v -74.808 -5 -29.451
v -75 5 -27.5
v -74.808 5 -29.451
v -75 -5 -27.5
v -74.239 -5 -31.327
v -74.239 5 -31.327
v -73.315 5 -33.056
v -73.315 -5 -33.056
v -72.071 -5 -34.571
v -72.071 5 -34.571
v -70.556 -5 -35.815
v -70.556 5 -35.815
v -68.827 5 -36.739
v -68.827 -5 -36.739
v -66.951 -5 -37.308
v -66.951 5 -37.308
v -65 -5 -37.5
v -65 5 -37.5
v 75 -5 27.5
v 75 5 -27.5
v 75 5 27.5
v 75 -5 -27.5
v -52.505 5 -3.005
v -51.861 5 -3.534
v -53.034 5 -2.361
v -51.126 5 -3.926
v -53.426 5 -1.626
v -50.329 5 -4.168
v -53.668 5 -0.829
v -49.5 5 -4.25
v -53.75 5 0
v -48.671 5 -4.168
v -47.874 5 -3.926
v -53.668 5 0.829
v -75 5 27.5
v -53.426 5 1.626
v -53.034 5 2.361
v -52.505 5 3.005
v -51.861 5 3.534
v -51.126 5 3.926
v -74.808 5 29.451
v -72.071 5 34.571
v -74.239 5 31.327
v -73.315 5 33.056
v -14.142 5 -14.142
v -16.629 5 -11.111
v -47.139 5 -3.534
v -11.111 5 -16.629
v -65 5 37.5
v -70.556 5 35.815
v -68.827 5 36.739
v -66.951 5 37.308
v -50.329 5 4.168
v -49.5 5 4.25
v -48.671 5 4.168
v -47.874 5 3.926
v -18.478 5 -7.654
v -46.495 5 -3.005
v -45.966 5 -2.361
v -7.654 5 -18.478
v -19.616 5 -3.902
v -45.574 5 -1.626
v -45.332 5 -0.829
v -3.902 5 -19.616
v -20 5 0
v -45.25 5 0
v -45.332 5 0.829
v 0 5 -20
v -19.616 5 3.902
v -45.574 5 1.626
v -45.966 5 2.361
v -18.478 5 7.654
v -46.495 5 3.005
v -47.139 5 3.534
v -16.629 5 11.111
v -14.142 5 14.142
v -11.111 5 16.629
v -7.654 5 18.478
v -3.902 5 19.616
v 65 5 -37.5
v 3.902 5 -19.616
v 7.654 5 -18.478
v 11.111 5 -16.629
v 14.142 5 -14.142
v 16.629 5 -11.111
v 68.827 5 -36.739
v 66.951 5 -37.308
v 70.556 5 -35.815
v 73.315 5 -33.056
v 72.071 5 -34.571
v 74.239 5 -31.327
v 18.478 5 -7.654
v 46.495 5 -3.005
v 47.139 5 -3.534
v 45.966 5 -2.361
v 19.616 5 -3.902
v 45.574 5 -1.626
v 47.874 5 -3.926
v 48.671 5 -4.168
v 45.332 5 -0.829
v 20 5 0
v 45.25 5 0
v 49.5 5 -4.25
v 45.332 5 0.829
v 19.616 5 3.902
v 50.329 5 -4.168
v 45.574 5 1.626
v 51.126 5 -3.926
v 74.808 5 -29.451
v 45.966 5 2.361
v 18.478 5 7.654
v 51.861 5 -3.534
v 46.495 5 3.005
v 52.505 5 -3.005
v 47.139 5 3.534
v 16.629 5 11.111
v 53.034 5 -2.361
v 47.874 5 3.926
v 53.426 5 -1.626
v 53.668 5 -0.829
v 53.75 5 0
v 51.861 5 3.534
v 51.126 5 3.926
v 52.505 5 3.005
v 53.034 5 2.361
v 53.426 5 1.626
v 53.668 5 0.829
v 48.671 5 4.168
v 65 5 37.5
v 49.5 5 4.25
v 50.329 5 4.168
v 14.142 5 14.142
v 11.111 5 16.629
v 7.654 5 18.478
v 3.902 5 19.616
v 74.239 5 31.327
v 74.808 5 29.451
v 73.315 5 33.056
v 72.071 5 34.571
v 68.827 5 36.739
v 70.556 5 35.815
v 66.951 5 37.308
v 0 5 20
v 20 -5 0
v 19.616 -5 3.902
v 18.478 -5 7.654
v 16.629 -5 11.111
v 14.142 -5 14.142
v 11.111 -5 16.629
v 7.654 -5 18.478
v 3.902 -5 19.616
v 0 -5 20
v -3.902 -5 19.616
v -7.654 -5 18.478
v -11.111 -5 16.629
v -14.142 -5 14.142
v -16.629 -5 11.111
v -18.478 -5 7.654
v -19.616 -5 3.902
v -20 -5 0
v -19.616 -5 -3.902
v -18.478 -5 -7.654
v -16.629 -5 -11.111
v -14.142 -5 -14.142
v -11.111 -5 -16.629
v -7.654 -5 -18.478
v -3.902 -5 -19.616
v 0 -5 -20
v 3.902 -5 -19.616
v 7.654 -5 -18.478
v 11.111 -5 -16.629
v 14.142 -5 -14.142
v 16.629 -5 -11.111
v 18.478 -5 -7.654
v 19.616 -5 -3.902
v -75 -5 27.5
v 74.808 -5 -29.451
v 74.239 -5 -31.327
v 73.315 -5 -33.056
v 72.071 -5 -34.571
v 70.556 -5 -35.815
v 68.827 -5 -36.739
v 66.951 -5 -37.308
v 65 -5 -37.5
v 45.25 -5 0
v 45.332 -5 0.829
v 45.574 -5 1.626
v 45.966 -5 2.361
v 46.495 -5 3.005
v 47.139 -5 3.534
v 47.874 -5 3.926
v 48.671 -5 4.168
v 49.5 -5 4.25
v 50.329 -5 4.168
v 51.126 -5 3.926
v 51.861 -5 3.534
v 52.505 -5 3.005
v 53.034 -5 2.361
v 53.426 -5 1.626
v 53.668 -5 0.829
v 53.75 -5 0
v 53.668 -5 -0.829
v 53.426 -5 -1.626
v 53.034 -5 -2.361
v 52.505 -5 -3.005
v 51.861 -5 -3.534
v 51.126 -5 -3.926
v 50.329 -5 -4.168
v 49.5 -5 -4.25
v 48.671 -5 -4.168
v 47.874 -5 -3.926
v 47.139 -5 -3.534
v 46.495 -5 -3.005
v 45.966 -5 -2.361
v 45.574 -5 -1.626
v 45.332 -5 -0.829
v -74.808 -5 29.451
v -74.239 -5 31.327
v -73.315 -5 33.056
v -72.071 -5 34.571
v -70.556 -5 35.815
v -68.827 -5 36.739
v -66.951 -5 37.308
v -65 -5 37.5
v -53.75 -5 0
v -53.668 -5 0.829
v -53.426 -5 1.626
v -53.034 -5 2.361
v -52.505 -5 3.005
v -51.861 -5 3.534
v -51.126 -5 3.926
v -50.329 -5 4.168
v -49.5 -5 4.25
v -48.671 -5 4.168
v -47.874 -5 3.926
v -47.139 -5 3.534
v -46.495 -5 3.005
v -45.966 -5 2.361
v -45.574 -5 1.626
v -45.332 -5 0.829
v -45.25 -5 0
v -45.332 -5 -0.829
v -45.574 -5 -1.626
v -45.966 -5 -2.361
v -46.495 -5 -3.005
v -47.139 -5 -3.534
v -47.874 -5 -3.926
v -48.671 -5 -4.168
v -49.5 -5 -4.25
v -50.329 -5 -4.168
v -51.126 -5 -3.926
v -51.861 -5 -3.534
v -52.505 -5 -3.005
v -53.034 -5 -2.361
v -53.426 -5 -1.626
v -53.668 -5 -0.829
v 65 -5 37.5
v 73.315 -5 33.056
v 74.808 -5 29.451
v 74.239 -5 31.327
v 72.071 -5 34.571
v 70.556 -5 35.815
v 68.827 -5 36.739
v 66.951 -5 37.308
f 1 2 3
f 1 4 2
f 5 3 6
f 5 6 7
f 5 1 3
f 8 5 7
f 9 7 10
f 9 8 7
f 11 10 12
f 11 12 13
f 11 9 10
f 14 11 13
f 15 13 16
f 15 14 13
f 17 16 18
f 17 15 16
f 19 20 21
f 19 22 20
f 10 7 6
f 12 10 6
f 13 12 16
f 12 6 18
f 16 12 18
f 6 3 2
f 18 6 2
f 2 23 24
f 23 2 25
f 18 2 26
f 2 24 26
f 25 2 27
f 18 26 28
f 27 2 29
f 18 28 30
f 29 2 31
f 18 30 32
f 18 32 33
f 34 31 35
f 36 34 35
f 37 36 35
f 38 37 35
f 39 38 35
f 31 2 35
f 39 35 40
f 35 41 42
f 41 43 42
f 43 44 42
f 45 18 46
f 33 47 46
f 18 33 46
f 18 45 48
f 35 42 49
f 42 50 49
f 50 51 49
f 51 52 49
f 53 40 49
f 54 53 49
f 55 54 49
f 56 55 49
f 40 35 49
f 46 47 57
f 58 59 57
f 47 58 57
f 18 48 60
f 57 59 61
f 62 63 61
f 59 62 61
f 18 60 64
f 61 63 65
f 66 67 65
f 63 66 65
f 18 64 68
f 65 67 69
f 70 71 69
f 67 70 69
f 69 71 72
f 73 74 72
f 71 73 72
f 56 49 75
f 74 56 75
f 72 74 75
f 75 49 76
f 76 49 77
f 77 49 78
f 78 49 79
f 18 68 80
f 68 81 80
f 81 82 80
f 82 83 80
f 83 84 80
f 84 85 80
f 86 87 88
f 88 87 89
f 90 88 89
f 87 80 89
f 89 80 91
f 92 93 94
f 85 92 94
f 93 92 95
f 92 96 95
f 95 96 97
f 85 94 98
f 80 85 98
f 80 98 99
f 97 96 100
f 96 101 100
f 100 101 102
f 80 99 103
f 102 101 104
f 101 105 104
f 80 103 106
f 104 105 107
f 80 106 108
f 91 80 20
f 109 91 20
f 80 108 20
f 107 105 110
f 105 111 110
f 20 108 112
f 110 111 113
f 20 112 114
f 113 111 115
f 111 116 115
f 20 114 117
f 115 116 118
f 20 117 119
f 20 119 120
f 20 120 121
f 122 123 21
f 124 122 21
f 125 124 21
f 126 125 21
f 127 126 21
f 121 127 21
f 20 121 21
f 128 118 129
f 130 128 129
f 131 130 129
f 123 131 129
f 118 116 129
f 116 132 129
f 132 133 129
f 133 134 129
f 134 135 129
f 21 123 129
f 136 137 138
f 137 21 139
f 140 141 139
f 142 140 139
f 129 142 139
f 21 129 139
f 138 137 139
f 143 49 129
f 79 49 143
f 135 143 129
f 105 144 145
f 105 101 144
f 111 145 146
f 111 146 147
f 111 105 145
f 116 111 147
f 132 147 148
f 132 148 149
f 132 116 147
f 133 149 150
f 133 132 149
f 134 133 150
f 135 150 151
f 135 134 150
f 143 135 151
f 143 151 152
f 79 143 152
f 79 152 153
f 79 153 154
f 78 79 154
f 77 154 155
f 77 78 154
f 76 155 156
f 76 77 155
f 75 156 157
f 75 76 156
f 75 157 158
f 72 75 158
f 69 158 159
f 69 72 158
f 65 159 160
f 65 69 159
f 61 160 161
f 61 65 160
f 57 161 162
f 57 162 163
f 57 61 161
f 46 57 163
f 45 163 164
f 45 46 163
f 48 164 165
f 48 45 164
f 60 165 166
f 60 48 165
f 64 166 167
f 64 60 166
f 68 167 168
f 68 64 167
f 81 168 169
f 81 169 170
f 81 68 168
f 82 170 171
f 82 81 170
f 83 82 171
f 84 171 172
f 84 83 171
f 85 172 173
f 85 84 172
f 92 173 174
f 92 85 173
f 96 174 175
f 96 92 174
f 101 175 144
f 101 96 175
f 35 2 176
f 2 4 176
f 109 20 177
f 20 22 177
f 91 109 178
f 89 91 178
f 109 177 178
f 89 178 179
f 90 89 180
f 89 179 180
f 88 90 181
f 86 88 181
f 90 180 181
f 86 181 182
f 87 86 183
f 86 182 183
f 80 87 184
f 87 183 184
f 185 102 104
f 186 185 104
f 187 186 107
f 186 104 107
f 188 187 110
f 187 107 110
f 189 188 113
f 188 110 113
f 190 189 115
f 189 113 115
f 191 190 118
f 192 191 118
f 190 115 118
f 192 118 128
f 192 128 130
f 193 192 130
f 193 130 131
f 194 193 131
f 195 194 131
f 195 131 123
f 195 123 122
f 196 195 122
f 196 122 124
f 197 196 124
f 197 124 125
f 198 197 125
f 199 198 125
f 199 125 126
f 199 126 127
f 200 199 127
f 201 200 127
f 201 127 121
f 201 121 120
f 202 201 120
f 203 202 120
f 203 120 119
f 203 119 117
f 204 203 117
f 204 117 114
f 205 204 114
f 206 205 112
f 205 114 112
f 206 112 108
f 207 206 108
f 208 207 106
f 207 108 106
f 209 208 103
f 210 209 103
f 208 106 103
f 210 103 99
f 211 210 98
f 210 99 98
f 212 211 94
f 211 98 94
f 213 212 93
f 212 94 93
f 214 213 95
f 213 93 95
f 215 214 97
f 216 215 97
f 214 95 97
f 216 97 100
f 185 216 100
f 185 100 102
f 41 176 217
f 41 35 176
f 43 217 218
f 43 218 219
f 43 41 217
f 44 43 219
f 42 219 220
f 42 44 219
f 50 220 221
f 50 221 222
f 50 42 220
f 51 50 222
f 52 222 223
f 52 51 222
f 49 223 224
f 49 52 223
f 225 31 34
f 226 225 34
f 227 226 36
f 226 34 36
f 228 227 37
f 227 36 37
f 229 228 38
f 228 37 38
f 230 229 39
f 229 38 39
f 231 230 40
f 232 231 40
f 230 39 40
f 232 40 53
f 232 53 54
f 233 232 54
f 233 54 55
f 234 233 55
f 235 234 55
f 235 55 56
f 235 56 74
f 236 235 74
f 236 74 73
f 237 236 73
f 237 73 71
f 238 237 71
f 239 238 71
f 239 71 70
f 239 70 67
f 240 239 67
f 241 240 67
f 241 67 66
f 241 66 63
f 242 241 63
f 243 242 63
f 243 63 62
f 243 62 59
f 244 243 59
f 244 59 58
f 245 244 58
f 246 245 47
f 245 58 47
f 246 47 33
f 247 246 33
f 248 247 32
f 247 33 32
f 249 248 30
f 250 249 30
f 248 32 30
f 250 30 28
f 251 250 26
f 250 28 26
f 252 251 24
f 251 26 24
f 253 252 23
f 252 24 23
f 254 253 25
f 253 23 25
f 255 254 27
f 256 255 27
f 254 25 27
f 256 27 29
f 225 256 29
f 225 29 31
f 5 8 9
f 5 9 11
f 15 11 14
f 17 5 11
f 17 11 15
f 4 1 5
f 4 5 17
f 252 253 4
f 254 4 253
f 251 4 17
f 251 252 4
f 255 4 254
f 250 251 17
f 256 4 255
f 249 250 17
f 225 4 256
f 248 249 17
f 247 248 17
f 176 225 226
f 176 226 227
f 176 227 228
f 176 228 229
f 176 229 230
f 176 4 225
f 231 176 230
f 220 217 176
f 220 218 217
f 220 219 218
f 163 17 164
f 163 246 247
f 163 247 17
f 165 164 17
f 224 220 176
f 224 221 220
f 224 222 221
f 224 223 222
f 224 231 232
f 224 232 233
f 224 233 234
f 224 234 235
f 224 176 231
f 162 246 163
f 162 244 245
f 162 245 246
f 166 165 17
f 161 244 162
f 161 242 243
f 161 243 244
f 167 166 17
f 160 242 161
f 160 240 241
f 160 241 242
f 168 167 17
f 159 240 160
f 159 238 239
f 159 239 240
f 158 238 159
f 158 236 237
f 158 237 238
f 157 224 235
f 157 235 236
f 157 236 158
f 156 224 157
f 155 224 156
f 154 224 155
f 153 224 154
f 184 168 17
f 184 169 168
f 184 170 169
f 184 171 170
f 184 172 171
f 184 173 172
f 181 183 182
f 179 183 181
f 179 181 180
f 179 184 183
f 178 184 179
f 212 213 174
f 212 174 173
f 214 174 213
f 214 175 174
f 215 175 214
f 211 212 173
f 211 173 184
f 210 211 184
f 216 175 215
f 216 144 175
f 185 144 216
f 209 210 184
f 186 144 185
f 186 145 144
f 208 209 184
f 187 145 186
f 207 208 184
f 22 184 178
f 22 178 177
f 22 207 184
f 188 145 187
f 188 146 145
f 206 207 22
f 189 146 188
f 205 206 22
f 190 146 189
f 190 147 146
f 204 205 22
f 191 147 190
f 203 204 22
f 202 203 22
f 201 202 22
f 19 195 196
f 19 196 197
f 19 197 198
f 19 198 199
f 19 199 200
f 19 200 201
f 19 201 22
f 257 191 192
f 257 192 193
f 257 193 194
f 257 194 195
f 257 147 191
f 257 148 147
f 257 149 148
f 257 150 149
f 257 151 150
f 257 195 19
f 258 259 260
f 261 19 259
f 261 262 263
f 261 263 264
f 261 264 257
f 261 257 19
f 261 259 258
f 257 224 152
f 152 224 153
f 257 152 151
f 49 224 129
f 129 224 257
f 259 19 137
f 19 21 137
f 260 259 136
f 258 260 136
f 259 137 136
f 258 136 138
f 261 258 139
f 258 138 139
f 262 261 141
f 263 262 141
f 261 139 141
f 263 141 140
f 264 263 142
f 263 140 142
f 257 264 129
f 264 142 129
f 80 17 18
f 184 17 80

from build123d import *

# Parameters (mm, degrees)
F0_W     = 150
F0_H     = 75
F0_R     = 20
F1_DEPTH = 5
F2_R     = 10
F4_D     = 8.5
F4_DEPTH = 24.5
F4_TIP   = 2.5536576309


with BuildPart() as f1:
    # F0 (on Front) → F1 (new body, symmetric)
    with BuildSketch(Plane.XZ):
        Rectangle(F0_W, F0_H)
        Circle(F0_R, mode=Mode.SUBTRACT)
    extrude(amount=F1_DEPTH, both=True)

    # F2
    f2_edges = [f1.edges().sort_by_distance(p)[0] for p in [
        (-75, 0, 37.5),
        (75, 0, 37.5),
        (75, 0, -37.5),
        (-75, 0, -37.5),
    ]]
    fillet(f2_edges, radius=F2_R)

    # F4
    with Locations(Plane.XZ.offset(5)):
        with Locations((-49.5, 0), (49.5, 0)):
            Hole(F4_D / 2, depth=F4_DEPTH)
            with Locations((0, 0, -(F4_DEPTH + F4_TIP / 2))):  # 118° drill point
                Cone(0, F4_D / 2, F4_TIP, mode=Mode.SUBTRACT)


solid = f1.part
